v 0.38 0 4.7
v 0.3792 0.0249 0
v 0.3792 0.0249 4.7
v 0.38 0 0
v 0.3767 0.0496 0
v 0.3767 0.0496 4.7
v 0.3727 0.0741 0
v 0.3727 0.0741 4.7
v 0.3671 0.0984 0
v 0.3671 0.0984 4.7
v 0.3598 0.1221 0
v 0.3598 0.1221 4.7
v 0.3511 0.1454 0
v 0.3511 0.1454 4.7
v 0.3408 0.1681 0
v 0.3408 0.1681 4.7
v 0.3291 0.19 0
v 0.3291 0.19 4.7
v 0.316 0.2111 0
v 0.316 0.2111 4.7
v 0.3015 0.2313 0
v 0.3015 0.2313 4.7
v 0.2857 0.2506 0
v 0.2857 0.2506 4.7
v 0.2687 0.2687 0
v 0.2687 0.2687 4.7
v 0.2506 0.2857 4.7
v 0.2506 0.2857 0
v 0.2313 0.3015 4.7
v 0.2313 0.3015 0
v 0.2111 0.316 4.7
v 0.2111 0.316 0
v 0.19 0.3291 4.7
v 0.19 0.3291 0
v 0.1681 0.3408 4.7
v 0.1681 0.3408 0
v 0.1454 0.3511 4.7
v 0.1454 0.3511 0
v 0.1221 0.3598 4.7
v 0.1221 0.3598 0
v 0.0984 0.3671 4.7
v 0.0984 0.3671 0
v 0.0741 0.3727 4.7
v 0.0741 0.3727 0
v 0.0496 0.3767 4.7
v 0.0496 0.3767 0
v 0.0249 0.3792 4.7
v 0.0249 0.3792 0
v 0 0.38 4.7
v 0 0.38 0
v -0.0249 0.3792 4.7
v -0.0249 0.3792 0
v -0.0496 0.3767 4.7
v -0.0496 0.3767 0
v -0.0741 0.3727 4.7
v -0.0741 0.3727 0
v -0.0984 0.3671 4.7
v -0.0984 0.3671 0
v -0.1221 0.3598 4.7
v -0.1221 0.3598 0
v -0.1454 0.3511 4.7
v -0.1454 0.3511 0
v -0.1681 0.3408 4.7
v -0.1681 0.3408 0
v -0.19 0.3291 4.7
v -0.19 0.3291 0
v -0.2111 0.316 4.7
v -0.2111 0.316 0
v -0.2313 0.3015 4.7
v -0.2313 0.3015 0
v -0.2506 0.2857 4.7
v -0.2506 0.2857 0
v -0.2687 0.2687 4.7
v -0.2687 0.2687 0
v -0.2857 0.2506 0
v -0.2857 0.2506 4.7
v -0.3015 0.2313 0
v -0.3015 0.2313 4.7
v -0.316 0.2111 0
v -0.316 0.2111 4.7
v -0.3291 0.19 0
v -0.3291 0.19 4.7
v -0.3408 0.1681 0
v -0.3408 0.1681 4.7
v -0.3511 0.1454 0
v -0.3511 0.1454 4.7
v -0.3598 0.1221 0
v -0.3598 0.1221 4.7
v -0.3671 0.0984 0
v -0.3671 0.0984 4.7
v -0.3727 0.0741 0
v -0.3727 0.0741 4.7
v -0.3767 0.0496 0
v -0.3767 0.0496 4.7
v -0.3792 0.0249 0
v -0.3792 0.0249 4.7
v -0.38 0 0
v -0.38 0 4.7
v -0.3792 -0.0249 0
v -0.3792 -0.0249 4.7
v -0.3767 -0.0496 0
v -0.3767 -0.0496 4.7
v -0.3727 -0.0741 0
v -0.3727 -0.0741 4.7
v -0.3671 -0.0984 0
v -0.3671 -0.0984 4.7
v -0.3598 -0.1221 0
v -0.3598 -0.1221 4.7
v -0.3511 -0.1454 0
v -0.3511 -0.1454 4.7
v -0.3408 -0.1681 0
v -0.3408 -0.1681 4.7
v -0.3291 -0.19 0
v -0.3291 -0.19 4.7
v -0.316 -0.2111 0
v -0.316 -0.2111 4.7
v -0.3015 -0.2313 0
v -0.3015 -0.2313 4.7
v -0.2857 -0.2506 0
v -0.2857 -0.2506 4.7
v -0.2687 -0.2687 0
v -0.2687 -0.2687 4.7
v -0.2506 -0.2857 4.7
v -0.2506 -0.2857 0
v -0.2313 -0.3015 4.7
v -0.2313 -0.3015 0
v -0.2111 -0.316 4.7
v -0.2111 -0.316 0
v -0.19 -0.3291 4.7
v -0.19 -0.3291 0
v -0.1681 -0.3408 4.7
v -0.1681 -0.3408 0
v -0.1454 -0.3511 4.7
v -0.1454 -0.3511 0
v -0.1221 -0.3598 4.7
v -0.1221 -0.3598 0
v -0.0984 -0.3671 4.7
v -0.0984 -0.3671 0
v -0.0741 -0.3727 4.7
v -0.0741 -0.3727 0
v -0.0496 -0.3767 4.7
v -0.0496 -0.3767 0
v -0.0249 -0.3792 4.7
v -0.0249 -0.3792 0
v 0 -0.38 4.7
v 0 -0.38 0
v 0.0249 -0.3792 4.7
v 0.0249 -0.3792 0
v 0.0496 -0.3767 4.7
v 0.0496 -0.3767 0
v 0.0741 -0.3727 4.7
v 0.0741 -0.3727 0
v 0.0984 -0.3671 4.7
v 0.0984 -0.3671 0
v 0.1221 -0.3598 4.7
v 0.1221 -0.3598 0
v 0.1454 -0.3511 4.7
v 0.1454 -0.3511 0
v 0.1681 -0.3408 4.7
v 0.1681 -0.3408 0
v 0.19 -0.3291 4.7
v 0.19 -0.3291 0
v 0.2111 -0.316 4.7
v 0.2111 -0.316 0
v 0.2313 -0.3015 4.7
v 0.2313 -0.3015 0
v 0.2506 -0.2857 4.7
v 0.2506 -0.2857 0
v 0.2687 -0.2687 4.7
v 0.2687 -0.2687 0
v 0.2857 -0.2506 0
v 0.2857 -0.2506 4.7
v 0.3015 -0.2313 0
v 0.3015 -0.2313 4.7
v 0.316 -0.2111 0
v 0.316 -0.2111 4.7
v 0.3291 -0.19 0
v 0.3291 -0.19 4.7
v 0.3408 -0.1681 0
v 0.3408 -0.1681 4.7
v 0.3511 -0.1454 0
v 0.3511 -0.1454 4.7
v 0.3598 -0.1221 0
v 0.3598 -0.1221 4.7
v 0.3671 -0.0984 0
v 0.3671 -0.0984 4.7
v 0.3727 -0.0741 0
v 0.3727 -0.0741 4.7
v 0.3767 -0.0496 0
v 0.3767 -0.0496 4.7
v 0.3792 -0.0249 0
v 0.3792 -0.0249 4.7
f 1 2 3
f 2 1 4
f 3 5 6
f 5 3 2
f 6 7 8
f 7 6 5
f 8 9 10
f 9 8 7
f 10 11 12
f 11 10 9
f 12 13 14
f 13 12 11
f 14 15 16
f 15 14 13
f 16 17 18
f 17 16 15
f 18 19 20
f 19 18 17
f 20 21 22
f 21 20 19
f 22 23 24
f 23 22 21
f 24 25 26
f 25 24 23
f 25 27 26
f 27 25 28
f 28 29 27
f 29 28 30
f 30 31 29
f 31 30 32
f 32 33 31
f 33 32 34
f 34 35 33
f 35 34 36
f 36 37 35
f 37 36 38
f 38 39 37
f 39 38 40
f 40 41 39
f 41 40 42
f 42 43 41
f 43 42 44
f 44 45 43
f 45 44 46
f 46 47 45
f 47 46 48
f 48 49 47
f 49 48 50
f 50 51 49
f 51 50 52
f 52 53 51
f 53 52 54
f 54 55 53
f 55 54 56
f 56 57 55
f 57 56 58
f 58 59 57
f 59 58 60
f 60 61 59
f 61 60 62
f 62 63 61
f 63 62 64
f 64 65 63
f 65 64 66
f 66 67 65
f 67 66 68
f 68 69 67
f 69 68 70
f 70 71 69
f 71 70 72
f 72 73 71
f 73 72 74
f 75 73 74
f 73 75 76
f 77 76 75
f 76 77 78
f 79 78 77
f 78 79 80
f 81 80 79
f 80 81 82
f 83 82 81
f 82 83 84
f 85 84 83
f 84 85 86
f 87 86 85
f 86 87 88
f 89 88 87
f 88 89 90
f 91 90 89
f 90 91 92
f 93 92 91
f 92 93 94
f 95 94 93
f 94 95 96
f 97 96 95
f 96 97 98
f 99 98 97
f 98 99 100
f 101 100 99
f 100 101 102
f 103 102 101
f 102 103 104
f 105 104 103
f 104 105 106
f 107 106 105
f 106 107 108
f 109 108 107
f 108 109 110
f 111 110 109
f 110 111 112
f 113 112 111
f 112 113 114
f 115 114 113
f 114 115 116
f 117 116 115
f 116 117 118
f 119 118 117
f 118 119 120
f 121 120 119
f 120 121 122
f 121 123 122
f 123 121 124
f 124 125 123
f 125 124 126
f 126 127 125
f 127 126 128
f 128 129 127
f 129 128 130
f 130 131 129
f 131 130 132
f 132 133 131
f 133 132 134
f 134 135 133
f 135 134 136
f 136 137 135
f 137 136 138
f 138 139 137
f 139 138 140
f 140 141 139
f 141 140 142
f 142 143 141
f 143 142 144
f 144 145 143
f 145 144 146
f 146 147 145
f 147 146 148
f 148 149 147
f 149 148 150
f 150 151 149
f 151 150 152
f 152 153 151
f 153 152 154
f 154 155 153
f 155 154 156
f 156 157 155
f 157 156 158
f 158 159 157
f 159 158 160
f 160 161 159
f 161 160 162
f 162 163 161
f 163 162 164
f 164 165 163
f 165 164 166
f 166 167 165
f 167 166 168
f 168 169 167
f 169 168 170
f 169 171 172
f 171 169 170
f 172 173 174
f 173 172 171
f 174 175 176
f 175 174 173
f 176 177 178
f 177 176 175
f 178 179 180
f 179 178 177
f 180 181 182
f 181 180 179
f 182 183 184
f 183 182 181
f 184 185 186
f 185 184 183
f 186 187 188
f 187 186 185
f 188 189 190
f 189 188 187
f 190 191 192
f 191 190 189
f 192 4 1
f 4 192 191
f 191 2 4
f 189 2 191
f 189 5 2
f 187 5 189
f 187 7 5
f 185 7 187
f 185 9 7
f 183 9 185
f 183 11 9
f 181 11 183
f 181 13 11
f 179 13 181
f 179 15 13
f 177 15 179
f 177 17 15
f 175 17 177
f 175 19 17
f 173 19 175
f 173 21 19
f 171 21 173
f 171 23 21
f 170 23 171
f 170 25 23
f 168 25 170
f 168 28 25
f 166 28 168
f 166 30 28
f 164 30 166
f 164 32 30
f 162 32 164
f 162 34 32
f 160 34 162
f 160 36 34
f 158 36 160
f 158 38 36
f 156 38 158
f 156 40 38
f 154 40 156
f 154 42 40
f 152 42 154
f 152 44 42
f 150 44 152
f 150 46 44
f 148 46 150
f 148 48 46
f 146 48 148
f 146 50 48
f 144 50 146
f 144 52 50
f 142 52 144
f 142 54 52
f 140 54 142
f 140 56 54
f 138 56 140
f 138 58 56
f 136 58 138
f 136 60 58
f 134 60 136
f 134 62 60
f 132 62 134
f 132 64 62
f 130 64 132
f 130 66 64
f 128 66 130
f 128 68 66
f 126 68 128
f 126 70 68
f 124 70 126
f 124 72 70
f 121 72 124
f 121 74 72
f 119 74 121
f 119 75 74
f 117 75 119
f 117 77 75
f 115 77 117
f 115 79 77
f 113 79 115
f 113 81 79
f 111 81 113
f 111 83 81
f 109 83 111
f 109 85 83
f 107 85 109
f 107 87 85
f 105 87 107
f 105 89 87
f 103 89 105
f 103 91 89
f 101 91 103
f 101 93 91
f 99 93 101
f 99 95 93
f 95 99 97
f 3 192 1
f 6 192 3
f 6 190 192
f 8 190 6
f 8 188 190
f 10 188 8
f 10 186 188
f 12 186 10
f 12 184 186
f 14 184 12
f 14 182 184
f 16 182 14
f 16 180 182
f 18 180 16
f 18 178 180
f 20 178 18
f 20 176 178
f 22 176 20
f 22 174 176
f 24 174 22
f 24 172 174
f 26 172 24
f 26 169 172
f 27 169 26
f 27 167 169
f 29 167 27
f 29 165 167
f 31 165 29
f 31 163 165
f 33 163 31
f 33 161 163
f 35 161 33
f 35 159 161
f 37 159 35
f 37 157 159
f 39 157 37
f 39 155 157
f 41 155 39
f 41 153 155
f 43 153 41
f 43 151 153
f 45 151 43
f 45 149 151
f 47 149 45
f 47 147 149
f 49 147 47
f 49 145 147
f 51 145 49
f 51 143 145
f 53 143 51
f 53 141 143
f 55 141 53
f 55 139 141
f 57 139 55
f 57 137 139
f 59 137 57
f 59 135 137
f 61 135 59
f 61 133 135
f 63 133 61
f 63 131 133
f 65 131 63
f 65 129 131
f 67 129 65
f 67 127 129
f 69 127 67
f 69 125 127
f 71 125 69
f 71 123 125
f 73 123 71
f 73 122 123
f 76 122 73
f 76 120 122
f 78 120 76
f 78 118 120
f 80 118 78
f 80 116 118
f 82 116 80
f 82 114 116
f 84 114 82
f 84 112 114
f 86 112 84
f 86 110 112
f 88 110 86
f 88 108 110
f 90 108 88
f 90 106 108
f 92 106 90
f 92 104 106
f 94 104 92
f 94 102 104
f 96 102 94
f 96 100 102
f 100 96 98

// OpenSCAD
$fn=96;

body_d = 0.76;
body_h = 4.7;

module toggle_switch(body_d=0.76, body_h=4.7) {
    // Simple cylindrical body representation
    cylinder(d=body_d, h=body_h, center=false);
}

toggle_switch(body_d, body_h);
